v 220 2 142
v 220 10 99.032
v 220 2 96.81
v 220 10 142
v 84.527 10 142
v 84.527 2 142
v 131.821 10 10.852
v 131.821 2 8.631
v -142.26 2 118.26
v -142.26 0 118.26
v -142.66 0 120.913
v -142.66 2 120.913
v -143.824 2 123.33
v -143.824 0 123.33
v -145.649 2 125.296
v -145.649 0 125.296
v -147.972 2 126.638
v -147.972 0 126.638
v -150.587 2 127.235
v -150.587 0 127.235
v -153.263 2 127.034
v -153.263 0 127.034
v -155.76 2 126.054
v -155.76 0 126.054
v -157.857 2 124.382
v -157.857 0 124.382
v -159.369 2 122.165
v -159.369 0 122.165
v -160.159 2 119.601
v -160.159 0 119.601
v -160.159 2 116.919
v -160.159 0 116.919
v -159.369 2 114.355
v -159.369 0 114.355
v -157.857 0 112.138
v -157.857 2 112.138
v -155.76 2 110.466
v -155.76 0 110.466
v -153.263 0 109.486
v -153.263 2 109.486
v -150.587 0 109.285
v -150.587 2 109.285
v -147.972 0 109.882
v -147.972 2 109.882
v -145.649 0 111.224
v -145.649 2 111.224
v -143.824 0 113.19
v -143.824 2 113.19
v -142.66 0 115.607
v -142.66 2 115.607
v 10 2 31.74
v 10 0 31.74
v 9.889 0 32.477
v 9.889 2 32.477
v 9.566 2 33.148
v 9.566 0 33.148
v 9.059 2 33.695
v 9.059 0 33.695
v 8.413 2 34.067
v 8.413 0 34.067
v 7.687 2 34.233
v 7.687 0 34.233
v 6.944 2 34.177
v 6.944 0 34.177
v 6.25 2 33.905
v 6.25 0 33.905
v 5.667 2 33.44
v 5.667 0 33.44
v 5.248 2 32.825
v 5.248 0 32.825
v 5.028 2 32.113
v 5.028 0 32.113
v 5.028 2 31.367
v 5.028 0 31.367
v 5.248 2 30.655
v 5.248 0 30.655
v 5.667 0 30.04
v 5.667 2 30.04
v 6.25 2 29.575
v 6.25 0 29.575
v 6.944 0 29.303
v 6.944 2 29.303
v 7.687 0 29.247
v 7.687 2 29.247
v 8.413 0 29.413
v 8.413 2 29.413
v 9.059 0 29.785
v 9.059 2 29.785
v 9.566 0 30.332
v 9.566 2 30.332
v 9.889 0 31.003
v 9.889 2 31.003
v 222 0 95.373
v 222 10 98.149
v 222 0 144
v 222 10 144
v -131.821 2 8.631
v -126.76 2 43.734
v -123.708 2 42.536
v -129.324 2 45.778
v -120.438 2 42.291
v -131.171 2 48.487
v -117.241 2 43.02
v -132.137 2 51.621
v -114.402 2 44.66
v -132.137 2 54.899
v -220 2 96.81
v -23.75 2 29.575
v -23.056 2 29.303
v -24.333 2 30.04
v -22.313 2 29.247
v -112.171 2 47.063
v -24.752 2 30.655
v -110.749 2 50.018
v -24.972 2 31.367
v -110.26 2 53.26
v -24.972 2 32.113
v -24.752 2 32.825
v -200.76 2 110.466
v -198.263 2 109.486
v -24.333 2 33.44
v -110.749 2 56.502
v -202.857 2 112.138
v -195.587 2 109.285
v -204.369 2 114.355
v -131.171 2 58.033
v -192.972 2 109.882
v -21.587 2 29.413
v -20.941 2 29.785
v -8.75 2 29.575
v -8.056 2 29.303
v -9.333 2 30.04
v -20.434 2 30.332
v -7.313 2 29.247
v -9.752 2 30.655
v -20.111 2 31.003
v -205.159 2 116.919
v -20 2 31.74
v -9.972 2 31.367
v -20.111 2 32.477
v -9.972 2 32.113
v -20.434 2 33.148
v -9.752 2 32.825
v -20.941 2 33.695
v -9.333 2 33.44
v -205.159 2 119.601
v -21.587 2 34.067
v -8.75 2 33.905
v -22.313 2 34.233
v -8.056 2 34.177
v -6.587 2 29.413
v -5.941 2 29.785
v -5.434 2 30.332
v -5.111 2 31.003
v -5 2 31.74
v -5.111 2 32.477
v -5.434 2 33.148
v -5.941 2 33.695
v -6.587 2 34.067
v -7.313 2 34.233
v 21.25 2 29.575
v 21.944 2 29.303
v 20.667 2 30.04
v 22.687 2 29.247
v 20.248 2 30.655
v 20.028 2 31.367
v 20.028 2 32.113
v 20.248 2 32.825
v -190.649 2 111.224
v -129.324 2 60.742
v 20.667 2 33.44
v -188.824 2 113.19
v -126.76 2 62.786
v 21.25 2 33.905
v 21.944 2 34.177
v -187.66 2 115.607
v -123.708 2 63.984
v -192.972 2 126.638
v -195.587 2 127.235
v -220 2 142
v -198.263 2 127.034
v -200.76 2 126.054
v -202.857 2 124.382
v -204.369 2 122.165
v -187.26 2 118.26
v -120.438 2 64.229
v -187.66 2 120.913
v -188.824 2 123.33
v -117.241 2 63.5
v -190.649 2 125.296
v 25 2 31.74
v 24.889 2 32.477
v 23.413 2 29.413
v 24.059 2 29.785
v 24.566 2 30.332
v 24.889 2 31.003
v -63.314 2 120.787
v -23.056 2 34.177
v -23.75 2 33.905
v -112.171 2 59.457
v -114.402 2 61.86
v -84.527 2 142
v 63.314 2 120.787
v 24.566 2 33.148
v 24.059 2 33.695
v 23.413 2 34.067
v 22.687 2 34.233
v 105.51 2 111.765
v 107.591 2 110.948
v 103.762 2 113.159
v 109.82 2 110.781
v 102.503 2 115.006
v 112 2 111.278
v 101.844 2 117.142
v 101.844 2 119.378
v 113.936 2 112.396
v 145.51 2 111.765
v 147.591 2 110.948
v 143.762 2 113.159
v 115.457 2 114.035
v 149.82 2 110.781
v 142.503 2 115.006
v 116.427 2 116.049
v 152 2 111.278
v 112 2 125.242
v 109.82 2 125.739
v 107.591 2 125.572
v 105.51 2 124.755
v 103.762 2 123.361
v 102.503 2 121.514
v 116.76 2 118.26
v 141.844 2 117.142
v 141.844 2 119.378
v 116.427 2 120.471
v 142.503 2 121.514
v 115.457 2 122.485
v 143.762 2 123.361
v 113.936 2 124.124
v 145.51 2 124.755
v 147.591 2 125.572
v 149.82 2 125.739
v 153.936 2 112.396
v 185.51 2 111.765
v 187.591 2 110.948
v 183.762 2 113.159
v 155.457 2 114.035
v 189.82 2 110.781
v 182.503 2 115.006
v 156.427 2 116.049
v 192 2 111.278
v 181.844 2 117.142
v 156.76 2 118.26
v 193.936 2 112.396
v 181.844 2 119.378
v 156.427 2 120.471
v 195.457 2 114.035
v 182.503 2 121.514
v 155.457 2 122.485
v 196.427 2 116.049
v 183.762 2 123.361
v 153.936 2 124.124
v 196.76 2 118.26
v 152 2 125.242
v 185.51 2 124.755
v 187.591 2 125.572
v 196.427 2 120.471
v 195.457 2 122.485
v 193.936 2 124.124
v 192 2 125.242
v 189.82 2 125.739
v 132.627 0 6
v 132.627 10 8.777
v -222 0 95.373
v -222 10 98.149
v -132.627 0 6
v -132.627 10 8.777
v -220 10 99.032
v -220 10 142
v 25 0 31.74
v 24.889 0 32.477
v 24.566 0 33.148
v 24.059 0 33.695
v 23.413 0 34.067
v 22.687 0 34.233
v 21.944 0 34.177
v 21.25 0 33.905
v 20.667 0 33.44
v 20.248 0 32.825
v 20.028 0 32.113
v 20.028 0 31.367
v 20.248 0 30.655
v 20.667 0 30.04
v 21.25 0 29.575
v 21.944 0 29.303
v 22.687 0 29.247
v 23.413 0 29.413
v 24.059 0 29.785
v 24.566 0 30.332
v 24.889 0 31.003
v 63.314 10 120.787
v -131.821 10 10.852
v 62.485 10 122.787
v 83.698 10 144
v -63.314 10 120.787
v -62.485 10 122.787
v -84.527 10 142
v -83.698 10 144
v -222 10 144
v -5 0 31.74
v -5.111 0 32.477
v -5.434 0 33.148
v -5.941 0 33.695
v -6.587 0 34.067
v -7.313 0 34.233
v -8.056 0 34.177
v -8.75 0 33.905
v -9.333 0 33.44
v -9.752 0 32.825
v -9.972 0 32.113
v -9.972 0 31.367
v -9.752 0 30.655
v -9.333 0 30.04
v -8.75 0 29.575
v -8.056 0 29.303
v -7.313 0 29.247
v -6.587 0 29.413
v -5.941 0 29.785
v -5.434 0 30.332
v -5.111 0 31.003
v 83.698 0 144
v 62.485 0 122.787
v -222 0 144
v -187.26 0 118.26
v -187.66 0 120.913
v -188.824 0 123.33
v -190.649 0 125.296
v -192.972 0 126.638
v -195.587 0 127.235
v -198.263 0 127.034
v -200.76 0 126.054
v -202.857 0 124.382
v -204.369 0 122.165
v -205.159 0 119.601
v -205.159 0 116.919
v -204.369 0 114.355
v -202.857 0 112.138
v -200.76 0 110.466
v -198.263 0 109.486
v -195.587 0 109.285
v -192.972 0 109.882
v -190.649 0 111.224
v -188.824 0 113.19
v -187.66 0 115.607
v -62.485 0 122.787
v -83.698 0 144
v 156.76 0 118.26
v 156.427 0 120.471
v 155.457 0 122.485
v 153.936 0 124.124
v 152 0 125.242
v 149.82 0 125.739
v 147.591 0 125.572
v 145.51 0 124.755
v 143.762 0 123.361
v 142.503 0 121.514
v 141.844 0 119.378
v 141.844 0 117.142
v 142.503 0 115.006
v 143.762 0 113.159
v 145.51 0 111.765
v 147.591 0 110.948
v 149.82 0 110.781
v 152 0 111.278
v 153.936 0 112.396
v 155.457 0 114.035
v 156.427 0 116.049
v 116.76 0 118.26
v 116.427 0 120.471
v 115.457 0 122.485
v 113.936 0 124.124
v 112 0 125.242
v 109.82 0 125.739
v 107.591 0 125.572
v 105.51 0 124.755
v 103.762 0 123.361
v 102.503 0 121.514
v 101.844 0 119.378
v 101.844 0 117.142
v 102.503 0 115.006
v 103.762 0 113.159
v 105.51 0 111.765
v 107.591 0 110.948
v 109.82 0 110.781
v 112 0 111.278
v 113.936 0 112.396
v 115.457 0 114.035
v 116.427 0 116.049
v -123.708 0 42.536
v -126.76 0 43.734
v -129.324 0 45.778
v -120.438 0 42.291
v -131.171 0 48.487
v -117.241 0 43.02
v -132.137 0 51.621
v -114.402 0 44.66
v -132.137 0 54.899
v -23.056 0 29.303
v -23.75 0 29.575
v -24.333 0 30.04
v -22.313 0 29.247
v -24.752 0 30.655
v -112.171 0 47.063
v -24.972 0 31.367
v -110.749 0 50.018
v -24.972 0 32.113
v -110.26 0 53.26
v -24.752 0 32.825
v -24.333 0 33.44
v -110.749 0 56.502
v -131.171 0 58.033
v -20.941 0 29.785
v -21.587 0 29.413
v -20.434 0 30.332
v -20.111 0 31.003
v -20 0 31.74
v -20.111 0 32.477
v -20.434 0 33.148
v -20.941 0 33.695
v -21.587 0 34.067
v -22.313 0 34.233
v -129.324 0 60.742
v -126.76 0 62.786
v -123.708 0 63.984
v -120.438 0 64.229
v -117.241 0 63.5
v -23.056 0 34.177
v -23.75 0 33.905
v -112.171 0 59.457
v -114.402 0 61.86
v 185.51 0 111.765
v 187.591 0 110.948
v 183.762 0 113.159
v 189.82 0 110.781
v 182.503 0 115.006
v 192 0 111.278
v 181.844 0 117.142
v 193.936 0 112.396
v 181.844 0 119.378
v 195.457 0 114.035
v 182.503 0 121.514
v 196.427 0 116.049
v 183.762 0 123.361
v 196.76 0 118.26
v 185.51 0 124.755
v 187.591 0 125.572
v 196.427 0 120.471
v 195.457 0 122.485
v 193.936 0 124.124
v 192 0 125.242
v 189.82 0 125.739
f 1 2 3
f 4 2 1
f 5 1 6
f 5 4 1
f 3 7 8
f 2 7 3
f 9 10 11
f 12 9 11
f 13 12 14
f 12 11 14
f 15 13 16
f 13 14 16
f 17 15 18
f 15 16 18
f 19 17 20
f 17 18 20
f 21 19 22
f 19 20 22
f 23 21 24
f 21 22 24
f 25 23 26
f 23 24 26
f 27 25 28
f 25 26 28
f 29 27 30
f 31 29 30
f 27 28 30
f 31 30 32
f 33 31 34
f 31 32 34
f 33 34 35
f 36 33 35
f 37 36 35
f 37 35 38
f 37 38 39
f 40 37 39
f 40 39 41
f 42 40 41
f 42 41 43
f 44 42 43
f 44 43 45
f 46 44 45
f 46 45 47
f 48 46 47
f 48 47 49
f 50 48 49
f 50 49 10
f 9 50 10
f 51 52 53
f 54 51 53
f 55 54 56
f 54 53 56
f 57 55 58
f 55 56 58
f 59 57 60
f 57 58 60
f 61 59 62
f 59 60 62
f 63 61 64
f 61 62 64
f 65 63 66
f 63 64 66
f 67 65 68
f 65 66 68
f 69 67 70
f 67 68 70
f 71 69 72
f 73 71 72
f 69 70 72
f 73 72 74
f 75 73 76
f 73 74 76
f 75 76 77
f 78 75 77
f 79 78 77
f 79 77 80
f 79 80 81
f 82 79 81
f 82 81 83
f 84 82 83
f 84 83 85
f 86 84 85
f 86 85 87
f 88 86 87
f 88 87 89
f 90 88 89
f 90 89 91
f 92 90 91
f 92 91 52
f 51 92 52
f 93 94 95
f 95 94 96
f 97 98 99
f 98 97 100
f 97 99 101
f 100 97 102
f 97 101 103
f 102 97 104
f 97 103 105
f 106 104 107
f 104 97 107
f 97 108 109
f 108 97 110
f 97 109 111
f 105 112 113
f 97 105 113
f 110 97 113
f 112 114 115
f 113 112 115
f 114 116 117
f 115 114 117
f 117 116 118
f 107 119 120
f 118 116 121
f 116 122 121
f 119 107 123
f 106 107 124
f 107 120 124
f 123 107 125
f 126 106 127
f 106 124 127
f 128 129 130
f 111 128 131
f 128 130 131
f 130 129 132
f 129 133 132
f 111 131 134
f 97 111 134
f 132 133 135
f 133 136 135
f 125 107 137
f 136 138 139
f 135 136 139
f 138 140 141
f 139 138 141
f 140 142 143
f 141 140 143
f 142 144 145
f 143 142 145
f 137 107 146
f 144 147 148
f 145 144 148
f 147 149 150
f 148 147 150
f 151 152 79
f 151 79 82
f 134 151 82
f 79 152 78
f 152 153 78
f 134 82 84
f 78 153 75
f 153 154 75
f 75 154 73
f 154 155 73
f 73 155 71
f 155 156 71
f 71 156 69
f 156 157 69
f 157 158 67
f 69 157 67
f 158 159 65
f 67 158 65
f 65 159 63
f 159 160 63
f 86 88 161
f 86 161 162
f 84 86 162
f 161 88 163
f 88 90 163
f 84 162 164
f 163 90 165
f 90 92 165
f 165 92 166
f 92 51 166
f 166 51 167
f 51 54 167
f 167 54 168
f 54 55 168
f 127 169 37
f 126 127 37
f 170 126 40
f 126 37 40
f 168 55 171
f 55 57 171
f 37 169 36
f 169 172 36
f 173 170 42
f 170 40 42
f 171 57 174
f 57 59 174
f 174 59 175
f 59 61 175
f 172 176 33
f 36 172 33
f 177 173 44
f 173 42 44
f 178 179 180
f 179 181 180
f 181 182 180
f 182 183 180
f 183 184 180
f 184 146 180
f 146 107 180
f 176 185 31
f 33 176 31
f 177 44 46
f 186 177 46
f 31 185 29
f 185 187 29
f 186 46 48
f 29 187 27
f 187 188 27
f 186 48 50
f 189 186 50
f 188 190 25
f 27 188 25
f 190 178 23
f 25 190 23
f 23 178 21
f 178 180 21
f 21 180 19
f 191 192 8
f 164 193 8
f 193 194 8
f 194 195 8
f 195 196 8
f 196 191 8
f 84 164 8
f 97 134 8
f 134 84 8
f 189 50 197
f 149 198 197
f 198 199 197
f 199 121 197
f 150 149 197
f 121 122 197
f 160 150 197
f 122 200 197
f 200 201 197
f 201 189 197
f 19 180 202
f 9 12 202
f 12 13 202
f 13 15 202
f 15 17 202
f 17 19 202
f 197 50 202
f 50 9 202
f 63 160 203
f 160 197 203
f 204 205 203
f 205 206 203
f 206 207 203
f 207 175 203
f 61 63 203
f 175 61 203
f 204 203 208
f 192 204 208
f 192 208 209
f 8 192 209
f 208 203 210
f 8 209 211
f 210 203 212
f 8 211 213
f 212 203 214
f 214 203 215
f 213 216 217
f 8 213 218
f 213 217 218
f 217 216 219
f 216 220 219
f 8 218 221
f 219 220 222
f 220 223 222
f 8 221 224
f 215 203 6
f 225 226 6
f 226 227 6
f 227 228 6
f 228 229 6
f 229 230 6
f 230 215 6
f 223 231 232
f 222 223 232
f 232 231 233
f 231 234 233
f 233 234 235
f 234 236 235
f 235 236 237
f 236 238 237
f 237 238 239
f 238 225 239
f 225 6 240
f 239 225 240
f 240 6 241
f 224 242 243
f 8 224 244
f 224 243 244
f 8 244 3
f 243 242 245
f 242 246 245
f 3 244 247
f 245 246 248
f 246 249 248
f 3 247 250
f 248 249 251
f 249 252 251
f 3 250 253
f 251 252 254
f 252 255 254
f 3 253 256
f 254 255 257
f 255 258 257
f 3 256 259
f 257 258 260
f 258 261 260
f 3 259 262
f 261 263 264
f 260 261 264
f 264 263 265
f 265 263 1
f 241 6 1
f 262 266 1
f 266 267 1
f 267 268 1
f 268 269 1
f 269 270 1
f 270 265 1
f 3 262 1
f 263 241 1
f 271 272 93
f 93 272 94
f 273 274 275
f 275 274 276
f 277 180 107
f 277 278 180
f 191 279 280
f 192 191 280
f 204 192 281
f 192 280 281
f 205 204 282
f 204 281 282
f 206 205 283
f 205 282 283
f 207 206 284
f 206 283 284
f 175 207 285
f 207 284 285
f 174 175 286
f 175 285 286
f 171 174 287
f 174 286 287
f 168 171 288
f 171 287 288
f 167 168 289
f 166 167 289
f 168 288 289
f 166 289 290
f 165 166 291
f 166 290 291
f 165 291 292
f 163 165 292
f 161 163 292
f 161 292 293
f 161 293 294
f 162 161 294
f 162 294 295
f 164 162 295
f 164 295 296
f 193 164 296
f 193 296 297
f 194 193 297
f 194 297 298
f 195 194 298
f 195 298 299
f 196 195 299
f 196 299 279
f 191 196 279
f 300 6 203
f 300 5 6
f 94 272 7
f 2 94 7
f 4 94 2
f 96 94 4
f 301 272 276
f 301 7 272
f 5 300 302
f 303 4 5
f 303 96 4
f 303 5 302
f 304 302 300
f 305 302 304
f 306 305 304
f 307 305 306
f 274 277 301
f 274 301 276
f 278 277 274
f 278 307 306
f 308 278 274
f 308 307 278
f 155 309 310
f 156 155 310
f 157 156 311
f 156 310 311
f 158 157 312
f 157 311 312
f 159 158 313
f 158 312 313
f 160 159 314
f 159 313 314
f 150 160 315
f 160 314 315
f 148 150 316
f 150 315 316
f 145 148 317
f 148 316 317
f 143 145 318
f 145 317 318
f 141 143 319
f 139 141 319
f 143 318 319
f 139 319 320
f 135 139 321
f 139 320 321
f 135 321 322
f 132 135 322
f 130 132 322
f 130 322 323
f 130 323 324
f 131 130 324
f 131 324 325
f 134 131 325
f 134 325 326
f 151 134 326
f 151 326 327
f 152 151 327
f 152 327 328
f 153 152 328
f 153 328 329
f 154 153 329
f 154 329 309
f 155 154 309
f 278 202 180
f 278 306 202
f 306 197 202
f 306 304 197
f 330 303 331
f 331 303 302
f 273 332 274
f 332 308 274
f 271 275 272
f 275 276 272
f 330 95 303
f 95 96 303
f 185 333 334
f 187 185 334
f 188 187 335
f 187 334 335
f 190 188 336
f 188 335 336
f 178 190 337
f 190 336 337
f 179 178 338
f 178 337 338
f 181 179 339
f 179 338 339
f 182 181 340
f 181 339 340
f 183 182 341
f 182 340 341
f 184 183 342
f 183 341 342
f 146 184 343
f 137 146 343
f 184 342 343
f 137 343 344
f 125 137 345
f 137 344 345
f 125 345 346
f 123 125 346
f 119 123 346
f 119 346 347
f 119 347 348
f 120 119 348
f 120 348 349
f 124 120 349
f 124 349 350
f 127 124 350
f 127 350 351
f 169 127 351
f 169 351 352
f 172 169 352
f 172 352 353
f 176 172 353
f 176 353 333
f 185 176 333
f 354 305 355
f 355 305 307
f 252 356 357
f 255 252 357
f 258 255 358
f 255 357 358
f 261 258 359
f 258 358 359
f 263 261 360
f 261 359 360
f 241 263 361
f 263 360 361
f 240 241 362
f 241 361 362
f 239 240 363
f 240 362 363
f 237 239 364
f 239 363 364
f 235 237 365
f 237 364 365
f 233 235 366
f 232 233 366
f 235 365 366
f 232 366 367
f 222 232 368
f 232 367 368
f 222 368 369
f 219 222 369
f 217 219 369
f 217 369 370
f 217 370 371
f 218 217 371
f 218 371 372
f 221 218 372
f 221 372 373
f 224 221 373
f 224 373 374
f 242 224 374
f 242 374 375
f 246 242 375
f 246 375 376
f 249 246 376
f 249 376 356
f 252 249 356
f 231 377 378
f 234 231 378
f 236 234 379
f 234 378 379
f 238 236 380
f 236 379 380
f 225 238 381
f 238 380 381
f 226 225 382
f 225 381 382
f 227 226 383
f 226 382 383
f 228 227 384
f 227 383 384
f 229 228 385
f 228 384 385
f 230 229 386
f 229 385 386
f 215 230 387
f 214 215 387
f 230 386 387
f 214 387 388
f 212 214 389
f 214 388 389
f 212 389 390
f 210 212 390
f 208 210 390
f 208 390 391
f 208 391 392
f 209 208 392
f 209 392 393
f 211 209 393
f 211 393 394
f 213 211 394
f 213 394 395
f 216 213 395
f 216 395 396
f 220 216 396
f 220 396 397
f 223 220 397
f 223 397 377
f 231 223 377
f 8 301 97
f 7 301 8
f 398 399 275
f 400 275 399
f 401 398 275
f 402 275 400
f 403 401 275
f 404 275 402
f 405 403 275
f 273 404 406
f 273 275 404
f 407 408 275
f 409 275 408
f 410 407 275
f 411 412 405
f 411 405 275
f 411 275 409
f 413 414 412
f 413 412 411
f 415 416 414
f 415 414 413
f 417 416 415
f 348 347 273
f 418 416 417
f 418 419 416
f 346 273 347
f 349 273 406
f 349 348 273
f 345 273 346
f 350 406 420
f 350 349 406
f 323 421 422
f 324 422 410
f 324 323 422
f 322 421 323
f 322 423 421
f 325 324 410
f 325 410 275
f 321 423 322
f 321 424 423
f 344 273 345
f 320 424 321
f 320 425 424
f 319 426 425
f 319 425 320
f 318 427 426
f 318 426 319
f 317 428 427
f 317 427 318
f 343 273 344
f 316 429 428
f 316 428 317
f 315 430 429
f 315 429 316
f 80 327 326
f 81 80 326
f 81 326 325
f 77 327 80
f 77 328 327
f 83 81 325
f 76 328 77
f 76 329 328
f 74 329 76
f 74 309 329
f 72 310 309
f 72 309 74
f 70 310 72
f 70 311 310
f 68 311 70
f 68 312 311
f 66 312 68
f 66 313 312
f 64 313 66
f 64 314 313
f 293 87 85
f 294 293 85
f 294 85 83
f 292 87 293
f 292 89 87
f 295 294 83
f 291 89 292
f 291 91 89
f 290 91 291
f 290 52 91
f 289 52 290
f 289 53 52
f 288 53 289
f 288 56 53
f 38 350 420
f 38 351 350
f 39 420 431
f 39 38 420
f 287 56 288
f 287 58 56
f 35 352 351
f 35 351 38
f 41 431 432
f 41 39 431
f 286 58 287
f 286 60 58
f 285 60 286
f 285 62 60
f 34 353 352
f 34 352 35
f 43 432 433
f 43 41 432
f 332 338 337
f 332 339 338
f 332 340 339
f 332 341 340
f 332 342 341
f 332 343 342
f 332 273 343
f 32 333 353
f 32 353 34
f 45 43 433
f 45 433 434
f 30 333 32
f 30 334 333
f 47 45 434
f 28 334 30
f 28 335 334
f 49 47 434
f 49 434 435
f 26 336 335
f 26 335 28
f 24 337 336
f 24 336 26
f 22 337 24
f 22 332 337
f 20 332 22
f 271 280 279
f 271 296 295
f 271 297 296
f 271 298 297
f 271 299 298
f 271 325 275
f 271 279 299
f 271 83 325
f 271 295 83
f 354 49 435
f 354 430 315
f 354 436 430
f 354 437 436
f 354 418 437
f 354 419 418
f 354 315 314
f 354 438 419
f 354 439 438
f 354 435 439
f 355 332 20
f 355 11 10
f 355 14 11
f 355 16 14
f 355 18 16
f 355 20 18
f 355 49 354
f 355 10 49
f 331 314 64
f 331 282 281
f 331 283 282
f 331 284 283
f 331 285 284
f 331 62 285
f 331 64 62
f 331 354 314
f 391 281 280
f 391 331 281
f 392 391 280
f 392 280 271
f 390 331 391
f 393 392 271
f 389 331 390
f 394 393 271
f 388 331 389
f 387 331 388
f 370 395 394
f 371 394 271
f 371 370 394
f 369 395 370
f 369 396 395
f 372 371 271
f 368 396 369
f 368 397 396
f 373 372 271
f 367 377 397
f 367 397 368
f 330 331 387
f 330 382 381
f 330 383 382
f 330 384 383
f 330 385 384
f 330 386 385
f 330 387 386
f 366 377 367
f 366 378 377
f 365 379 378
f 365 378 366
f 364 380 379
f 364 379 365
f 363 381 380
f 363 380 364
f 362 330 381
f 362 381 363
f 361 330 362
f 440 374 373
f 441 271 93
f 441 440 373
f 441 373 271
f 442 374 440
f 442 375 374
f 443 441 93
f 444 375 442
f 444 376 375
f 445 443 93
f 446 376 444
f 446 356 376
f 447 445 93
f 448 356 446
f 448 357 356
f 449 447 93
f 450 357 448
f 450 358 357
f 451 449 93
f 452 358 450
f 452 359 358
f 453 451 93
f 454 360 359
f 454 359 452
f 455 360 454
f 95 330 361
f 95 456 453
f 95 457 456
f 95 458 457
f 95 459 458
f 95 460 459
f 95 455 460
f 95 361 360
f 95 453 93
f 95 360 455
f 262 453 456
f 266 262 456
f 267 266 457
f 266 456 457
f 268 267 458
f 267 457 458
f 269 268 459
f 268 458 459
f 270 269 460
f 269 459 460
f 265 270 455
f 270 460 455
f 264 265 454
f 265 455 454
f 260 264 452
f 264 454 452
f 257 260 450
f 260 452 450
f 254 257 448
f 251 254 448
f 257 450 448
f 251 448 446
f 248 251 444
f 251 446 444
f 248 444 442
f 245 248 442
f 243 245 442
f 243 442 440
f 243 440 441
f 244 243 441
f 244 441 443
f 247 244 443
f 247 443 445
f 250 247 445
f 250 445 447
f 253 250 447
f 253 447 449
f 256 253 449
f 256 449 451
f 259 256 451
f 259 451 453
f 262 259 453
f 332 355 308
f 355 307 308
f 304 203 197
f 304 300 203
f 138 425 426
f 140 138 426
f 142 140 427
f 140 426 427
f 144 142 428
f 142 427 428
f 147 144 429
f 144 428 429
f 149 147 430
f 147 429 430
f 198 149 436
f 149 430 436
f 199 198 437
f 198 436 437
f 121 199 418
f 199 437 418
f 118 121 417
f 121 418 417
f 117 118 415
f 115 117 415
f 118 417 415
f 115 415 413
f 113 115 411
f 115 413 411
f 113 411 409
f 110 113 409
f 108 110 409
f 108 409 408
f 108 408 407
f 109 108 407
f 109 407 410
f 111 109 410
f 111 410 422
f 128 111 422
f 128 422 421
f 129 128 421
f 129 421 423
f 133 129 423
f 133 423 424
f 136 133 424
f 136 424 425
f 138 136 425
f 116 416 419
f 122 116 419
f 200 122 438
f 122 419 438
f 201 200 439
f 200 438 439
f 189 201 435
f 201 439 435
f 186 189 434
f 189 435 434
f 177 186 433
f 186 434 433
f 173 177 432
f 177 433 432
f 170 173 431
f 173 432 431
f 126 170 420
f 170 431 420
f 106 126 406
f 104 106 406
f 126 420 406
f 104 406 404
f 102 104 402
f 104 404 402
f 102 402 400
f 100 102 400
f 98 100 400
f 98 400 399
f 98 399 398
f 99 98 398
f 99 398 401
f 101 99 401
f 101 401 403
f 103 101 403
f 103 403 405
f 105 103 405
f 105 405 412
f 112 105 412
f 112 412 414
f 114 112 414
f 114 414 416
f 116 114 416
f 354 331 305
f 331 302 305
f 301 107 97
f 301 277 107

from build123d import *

# Parameters (mm, degrees)
SHELL1_T           = -2
SKETCH4_R          = 2.5
SKETCH4_R_2        = 7.5
SKETCH4_R_3        = 9
SKETCH4_R_4        = 11
CUT_EXTRUDE1_DEPTH = 10


with BuildPart() as part:
    # Sketch1 → Loft2 section 0
    with BuildSketch(Plane(origin=(0, 0, 0), x_dir=(1, 0, 0), z_dir=(0, 1, 0))):
        Polygon((-132.627416996, -6), (132.627416996, -6), (221.999999995, -95.372582999), (221.999999995, -144), (83.69848481, -144), (62.485281374, -122.786796564), (-62.485281374, -122.786796564), (-83.69848481, -144), (-221.999999995, -144), (-221.999999995, -95.372582999), align=None)
    # Sketch2 → Loft2 section 1
    with BuildSketch(Plane(origin=(0, 10, 0), x_dir=(1, 0, 0), z_dir=(0, 1, 0))):
        Polygon((-83.698484794, -144), (-62.485281361, -122.786796562), (62.485281387, -122.786796547), (83.69848481, -143.999999995), (222.00000001, -143.999999995), (222.00000001, -98.149280245), (132.627417005, -8.77669724), (-132.627416995, -8.77669724), (-221.999999995, -98.14928025), (-221.999999995, -144), align=None)
    loft()

    # Shell1
    shell1_openings = [part.faces().sort_by_distance(p)[0] for p in [
        (8e-09, 10, 103.542554807),
    ]]
    offset(amount=SHELL1_T, openings=shell1_openings, kind=Kind.INTERSECTION)

    # Sketch4 → Cut-Extrude1 (cut)
    with BuildSketch(Plane.XZ):
        with Locations((22.5, 31.74)):
            Circle(SKETCH4_R)
        with Locations((7.5, 31.74)):
            Circle(SKETCH4_R)
        with Locations((-7.5, 31.74)):
            Circle(SKETCH4_R)
        with Locations((-22.5, 31.74)):
            Circle(SKETCH4_R)
        with Locations((189.259999995, 118.26)):
            Circle(SKETCH4_R_2)
        with Locations((149.259999995, 118.26)):
            Circle(SKETCH4_R_2)
        with Locations((109.259999995, 118.26)):
            Circle(SKETCH4_R_2)
        with Locations((-151.259999995, 118.26)):
            Circle(SKETCH4_R_3)
        with Locations((-196.259999995, 118.26)):
            Circle(SKETCH4_R_3)
        with Locations((-121.259999995, 53.26)):
            Circle(SKETCH4_R_4)
    extrude(amount=-CUT_EXTRUDE1_DEPTH, mode=Mode.SUBTRACT)


solid = part.part
